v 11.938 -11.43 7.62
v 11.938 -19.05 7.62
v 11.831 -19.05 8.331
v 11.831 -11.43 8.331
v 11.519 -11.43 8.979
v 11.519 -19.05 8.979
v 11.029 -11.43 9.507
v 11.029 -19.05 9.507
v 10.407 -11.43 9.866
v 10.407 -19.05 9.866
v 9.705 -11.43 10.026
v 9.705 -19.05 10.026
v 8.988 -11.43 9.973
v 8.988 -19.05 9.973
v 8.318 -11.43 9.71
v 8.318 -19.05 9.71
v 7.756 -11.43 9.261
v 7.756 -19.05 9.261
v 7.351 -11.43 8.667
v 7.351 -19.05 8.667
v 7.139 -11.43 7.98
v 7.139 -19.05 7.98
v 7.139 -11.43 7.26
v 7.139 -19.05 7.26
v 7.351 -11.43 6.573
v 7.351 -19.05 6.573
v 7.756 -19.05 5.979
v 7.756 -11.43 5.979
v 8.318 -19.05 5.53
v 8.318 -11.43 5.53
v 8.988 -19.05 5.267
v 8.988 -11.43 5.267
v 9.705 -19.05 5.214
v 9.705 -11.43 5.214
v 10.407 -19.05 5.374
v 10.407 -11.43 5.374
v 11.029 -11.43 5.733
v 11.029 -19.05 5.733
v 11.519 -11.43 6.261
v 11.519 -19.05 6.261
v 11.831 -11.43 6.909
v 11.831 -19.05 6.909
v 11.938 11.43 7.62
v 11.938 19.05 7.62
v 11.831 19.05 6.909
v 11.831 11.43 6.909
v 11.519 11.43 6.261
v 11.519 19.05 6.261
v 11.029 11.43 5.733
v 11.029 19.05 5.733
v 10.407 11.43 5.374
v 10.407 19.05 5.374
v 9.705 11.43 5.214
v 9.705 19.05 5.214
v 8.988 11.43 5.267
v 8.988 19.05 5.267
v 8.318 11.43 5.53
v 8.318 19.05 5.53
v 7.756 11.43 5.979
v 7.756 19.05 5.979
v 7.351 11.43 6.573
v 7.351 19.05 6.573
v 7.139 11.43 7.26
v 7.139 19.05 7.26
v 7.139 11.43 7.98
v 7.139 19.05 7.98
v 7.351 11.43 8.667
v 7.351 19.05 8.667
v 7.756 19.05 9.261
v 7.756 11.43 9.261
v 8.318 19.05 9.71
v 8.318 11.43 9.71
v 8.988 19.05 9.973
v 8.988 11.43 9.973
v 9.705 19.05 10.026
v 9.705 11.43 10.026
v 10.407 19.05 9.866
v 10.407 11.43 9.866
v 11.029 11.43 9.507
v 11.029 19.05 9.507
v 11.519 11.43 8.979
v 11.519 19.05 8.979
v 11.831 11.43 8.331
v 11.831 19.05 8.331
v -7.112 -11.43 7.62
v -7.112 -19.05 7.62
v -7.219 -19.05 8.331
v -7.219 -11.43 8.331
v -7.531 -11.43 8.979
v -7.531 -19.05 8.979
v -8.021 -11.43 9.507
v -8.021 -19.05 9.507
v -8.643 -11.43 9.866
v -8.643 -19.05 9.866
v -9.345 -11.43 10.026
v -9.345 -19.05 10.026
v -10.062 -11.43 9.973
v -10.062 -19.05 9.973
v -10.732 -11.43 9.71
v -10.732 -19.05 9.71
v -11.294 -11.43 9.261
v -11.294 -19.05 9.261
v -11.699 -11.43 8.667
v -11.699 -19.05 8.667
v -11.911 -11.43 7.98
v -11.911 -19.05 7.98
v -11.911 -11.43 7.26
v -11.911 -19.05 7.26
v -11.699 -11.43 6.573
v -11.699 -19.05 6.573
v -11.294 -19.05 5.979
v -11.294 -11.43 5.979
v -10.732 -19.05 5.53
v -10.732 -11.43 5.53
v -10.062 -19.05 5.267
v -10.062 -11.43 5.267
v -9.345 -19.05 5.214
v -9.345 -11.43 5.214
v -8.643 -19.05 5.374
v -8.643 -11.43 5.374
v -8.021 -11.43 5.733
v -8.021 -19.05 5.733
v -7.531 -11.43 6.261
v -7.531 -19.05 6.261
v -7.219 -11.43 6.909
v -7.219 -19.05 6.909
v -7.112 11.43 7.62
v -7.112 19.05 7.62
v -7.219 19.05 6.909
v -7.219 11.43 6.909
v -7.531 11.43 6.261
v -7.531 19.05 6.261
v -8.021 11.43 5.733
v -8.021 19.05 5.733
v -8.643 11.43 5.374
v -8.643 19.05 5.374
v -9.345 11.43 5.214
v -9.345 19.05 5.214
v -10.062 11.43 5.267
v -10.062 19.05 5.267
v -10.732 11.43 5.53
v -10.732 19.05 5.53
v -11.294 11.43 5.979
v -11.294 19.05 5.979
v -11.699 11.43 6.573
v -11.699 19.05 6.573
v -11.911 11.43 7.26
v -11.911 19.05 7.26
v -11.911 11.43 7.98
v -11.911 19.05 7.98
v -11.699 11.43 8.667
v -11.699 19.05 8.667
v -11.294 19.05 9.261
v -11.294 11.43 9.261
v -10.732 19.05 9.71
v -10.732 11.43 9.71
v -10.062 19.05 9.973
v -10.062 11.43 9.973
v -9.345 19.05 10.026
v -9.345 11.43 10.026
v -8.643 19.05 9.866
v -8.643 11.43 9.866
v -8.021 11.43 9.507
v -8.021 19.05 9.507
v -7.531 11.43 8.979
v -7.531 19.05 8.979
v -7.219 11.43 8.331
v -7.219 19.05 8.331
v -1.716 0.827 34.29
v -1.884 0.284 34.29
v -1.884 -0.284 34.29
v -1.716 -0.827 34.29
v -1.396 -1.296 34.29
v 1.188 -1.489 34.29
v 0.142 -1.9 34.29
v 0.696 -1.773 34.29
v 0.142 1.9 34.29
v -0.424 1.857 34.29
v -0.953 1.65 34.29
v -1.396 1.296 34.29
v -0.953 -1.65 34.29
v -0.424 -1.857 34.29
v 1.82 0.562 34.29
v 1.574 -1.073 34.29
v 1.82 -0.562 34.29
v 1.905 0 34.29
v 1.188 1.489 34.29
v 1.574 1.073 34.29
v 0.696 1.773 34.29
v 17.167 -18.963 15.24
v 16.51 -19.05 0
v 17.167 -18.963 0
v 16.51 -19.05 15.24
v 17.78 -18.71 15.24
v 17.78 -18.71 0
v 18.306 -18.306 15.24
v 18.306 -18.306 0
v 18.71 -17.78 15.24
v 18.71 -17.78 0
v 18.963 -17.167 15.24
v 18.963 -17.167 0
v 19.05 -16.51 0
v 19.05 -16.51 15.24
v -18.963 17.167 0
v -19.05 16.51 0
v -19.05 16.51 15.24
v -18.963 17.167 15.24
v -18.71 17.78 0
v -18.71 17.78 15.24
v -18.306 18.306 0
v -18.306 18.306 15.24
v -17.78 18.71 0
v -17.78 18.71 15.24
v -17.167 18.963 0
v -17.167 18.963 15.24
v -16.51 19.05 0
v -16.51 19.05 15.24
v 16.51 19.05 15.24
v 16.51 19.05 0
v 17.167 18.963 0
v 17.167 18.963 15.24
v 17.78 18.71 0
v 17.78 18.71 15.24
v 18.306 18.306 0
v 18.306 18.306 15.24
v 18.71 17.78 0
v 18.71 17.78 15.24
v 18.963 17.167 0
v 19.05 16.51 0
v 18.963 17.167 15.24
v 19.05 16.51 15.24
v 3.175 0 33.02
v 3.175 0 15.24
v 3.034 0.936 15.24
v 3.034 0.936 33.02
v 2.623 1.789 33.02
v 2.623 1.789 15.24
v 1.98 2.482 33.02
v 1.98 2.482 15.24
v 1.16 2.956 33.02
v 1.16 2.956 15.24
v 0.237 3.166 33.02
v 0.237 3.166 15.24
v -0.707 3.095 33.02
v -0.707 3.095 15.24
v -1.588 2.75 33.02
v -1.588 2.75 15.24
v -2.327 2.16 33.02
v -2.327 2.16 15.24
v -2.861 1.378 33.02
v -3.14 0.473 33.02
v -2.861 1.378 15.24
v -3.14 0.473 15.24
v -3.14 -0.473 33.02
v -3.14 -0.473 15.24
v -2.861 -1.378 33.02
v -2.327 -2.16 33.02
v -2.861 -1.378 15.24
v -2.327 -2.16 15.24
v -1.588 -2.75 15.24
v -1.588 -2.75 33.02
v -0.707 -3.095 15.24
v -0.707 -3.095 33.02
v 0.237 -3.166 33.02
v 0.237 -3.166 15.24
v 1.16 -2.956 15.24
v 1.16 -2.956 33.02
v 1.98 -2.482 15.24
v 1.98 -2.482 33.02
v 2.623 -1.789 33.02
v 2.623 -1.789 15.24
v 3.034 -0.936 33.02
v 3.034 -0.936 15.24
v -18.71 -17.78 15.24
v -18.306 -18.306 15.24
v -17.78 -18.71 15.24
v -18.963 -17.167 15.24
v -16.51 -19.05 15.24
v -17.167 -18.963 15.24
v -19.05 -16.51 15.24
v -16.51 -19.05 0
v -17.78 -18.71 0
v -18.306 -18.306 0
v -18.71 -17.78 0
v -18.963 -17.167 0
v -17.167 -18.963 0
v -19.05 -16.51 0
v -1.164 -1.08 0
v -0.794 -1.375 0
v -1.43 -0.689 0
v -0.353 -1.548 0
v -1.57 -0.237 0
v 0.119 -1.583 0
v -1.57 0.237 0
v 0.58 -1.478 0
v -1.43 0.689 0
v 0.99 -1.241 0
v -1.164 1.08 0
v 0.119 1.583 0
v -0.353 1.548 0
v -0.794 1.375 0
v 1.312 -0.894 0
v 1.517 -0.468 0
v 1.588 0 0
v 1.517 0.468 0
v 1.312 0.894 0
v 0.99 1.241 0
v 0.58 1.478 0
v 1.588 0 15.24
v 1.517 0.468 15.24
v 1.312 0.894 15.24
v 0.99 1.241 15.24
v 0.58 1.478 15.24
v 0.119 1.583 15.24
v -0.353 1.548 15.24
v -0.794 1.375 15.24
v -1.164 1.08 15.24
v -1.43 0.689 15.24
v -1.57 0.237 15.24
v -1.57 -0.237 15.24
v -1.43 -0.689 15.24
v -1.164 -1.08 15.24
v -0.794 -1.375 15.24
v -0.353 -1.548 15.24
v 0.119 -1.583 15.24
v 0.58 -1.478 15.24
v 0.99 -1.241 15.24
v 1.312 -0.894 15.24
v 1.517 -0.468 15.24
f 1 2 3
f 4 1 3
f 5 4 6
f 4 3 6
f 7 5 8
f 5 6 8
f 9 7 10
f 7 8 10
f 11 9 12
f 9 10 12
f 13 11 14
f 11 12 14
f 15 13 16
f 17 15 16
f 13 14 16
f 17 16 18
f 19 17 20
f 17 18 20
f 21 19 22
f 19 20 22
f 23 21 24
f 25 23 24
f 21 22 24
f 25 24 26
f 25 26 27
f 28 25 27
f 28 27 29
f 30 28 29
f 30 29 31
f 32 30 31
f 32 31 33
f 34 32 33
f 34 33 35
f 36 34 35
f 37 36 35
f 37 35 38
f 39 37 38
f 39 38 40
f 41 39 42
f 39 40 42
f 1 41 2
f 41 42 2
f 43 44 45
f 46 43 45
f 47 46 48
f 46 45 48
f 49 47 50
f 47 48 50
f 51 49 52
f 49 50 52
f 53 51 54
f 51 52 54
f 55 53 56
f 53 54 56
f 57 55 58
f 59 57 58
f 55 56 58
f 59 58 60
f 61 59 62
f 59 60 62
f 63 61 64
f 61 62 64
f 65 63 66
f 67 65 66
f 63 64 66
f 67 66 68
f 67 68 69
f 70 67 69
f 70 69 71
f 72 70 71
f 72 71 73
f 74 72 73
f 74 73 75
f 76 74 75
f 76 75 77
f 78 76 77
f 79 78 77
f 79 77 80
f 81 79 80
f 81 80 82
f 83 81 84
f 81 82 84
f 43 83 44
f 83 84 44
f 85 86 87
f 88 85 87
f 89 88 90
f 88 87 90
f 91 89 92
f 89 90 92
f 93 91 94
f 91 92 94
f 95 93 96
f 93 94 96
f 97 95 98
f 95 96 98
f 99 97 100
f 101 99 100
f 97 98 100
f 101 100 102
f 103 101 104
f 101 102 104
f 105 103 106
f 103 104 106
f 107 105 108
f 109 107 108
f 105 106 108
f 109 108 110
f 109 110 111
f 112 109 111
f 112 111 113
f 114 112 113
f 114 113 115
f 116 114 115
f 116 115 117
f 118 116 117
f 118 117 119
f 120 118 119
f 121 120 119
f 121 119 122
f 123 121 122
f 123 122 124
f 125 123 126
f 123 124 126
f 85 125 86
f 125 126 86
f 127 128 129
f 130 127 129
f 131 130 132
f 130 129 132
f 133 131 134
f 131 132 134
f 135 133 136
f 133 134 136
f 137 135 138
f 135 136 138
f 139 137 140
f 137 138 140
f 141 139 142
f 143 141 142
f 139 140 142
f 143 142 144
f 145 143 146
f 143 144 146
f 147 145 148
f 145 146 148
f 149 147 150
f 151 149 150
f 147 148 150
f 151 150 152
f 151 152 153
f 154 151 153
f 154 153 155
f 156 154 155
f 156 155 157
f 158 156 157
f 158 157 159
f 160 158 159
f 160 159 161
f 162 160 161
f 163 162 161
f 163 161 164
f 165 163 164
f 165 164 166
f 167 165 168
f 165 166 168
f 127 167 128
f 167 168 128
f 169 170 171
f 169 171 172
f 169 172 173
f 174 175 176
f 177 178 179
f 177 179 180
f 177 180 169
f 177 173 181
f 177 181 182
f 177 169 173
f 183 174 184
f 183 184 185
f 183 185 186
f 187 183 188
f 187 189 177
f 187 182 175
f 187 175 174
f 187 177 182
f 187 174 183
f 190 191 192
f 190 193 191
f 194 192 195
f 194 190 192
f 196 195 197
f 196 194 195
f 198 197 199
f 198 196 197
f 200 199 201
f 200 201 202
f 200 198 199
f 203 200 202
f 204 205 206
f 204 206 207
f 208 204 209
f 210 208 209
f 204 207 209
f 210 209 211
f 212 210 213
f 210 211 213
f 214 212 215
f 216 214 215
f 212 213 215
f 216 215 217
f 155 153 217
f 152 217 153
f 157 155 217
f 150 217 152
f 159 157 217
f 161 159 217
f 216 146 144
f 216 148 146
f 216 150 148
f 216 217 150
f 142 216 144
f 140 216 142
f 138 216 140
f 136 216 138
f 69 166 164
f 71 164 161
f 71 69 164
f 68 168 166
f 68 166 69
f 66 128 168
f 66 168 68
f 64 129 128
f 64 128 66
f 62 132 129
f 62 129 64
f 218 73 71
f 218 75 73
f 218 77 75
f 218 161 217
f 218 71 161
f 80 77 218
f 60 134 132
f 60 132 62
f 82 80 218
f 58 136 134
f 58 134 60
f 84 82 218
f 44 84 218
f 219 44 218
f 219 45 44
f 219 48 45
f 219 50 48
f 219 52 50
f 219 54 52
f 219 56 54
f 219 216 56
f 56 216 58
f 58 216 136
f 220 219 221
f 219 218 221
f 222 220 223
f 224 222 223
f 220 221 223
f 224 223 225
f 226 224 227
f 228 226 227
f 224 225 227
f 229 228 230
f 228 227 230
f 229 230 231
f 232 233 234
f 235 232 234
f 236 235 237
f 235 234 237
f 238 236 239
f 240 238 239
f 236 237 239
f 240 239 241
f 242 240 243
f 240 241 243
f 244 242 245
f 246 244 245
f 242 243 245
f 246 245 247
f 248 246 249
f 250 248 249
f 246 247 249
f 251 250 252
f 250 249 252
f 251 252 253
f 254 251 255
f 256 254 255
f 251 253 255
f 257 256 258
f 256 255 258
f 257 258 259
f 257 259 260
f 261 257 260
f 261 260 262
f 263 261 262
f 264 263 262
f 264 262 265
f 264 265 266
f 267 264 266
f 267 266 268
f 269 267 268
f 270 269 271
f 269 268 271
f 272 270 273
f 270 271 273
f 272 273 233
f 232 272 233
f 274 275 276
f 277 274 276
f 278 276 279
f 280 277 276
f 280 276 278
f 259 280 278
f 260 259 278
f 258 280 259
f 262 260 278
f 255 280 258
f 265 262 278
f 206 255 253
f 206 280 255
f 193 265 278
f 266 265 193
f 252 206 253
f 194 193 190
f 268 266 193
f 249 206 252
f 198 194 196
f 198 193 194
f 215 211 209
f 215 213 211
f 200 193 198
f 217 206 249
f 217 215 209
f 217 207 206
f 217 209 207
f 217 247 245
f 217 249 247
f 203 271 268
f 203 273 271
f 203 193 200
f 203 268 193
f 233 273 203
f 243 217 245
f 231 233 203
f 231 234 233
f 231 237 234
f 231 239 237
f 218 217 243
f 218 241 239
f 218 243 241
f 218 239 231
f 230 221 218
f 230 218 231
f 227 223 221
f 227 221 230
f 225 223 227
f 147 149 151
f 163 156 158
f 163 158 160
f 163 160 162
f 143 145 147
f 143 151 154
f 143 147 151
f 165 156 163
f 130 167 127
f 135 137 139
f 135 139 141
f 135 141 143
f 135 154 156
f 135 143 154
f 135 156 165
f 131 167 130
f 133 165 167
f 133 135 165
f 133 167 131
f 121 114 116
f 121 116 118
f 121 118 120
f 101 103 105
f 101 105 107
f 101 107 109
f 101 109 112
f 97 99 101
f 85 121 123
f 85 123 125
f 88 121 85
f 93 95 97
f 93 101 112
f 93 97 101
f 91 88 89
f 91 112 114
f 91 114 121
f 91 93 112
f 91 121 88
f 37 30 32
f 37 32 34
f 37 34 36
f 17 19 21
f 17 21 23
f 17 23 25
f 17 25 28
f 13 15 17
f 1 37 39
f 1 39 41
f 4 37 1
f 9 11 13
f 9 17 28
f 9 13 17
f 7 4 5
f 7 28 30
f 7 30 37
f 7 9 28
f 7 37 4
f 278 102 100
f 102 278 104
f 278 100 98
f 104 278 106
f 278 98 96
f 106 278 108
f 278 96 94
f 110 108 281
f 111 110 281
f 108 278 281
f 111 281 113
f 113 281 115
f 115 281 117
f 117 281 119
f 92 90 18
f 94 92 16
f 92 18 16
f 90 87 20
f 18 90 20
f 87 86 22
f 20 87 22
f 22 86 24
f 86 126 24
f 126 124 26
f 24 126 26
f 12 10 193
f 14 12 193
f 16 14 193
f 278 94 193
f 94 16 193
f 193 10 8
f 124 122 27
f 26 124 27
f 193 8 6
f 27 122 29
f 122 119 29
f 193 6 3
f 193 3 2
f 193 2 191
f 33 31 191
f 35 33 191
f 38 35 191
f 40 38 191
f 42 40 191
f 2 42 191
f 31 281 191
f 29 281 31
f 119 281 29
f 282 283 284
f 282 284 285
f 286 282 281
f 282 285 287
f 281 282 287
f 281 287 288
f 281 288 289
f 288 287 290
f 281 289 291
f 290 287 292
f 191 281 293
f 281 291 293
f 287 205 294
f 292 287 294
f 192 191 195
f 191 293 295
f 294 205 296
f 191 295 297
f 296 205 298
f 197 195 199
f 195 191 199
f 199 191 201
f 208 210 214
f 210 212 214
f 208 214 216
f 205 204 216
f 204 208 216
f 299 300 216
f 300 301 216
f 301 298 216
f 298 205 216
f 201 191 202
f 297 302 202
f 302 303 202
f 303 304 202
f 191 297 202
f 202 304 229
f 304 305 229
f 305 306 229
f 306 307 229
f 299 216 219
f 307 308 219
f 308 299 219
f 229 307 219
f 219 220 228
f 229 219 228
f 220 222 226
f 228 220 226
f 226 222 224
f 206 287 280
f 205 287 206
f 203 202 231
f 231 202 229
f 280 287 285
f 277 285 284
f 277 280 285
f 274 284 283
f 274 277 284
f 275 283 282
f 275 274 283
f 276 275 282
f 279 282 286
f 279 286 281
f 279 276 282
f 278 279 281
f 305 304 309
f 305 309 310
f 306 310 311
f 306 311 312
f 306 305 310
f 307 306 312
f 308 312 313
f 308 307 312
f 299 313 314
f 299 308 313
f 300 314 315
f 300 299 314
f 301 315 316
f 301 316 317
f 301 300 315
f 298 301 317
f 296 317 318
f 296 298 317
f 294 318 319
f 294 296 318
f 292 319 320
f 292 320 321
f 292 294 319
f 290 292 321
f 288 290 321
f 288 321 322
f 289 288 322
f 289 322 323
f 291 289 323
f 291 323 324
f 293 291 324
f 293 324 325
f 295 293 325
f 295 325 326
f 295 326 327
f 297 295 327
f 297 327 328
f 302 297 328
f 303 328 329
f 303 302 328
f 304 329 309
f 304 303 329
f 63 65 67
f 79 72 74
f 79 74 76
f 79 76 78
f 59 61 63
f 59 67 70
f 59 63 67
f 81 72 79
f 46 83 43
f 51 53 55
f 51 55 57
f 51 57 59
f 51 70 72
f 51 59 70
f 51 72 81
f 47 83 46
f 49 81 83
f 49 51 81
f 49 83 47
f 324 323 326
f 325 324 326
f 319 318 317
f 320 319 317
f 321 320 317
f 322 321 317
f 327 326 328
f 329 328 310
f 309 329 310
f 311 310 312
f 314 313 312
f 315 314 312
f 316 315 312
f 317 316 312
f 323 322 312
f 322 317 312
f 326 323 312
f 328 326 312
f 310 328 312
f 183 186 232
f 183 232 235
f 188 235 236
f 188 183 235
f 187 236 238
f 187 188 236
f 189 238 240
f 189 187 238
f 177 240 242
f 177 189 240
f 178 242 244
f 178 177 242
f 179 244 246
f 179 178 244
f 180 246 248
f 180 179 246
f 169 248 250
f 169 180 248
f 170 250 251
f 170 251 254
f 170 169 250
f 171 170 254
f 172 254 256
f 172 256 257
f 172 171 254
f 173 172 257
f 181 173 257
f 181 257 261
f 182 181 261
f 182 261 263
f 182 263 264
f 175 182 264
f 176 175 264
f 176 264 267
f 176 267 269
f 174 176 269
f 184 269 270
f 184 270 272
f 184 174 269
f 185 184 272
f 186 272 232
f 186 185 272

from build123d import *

# Parameters (mm, degrees)
SKETCH1_W           = 38.1
SKETCH1_H           = 38.1
SKETCH1_R           = 1.5875
BOSS_EXTRUDE2_DEPTH = 15.24
SKETCH3_R           = 3.175
BOSS_EXTRUDE3_DEPTH = 19.05
FILLET2_R           = 2.54
CHAMFER1_SIZE       = 1.27
SKETCH4_R           = 2.413
CUT_EXTRUDE2_DEPTH  = 7.62
SKETCH5_R           = 2.413
CUT_EXTRUDE3_DEPTH  = 7.62


with BuildPart() as part:
    # Sketch1 → Boss-Extrude2 (new body)
    with BuildSketch(Plane.XY):
        Rectangle(SKETCH1_W, SKETCH1_H)
        Circle(SKETCH1_R, mode=Mode.SUBTRACT)
    extrude(amount=BOSS_EXTRUDE2_DEPTH)

    # Sketch3 → Boss-Extrude3 (add)
    with BuildSketch(Plane.XY.offset(15.24)):
        Circle(SKETCH3_R)
    extrude(amount=BOSS_EXTRUDE3_DEPTH)

    # Fillet2
    fillet2_edges = [part.edges().sort_by_distance(p)[0] for p in [
        (-19.05, 19.05, 7.62),
        (19.05, 19.05, 7.62),
        (19.05, -19.05, 7.62),
        (-19.05, -19.05, 7.62),
    ]]
    fillet(fillet2_edges, radius=FILLET2_R)

    # Chamfer1
    chamfer1_edges = [part.edges().sort_by_distance(p)[0] for p in [
        (-3.175, 0, 34.29),
    ]]
    chamfer(chamfer1_edges, length=CHAMFER1_SIZE)

    # Sketch4 → Cut-Extrude2 (cut)
    with BuildSketch(Plane.XZ.offset(19.05)):
        with Locations((-9.525, 7.62)):
            Circle(SKETCH4_R)
        with Locations((9.525, 7.62)):
            Circle(SKETCH4_R)
    extrude(amount=-CUT_EXTRUDE2_DEPTH, mode=Mode.SUBTRACT)

    # Sketch5 → Cut-Extrude3 (cut)
    with BuildSketch(Plane(origin=(0, 19.05, 0), x_dir=(1, 0, 0), z_dir=(0, 1, 0))):
        with Locations((9.525, -7.62)):
            Circle(SKETCH5_R)
        with Locations((-9.525, -7.62)):
            Circle(SKETCH5_R)
    extrude(amount=-CUT_EXTRUDE3_DEPTH, mode=Mode.SUBTRACT)


solid = part.part
